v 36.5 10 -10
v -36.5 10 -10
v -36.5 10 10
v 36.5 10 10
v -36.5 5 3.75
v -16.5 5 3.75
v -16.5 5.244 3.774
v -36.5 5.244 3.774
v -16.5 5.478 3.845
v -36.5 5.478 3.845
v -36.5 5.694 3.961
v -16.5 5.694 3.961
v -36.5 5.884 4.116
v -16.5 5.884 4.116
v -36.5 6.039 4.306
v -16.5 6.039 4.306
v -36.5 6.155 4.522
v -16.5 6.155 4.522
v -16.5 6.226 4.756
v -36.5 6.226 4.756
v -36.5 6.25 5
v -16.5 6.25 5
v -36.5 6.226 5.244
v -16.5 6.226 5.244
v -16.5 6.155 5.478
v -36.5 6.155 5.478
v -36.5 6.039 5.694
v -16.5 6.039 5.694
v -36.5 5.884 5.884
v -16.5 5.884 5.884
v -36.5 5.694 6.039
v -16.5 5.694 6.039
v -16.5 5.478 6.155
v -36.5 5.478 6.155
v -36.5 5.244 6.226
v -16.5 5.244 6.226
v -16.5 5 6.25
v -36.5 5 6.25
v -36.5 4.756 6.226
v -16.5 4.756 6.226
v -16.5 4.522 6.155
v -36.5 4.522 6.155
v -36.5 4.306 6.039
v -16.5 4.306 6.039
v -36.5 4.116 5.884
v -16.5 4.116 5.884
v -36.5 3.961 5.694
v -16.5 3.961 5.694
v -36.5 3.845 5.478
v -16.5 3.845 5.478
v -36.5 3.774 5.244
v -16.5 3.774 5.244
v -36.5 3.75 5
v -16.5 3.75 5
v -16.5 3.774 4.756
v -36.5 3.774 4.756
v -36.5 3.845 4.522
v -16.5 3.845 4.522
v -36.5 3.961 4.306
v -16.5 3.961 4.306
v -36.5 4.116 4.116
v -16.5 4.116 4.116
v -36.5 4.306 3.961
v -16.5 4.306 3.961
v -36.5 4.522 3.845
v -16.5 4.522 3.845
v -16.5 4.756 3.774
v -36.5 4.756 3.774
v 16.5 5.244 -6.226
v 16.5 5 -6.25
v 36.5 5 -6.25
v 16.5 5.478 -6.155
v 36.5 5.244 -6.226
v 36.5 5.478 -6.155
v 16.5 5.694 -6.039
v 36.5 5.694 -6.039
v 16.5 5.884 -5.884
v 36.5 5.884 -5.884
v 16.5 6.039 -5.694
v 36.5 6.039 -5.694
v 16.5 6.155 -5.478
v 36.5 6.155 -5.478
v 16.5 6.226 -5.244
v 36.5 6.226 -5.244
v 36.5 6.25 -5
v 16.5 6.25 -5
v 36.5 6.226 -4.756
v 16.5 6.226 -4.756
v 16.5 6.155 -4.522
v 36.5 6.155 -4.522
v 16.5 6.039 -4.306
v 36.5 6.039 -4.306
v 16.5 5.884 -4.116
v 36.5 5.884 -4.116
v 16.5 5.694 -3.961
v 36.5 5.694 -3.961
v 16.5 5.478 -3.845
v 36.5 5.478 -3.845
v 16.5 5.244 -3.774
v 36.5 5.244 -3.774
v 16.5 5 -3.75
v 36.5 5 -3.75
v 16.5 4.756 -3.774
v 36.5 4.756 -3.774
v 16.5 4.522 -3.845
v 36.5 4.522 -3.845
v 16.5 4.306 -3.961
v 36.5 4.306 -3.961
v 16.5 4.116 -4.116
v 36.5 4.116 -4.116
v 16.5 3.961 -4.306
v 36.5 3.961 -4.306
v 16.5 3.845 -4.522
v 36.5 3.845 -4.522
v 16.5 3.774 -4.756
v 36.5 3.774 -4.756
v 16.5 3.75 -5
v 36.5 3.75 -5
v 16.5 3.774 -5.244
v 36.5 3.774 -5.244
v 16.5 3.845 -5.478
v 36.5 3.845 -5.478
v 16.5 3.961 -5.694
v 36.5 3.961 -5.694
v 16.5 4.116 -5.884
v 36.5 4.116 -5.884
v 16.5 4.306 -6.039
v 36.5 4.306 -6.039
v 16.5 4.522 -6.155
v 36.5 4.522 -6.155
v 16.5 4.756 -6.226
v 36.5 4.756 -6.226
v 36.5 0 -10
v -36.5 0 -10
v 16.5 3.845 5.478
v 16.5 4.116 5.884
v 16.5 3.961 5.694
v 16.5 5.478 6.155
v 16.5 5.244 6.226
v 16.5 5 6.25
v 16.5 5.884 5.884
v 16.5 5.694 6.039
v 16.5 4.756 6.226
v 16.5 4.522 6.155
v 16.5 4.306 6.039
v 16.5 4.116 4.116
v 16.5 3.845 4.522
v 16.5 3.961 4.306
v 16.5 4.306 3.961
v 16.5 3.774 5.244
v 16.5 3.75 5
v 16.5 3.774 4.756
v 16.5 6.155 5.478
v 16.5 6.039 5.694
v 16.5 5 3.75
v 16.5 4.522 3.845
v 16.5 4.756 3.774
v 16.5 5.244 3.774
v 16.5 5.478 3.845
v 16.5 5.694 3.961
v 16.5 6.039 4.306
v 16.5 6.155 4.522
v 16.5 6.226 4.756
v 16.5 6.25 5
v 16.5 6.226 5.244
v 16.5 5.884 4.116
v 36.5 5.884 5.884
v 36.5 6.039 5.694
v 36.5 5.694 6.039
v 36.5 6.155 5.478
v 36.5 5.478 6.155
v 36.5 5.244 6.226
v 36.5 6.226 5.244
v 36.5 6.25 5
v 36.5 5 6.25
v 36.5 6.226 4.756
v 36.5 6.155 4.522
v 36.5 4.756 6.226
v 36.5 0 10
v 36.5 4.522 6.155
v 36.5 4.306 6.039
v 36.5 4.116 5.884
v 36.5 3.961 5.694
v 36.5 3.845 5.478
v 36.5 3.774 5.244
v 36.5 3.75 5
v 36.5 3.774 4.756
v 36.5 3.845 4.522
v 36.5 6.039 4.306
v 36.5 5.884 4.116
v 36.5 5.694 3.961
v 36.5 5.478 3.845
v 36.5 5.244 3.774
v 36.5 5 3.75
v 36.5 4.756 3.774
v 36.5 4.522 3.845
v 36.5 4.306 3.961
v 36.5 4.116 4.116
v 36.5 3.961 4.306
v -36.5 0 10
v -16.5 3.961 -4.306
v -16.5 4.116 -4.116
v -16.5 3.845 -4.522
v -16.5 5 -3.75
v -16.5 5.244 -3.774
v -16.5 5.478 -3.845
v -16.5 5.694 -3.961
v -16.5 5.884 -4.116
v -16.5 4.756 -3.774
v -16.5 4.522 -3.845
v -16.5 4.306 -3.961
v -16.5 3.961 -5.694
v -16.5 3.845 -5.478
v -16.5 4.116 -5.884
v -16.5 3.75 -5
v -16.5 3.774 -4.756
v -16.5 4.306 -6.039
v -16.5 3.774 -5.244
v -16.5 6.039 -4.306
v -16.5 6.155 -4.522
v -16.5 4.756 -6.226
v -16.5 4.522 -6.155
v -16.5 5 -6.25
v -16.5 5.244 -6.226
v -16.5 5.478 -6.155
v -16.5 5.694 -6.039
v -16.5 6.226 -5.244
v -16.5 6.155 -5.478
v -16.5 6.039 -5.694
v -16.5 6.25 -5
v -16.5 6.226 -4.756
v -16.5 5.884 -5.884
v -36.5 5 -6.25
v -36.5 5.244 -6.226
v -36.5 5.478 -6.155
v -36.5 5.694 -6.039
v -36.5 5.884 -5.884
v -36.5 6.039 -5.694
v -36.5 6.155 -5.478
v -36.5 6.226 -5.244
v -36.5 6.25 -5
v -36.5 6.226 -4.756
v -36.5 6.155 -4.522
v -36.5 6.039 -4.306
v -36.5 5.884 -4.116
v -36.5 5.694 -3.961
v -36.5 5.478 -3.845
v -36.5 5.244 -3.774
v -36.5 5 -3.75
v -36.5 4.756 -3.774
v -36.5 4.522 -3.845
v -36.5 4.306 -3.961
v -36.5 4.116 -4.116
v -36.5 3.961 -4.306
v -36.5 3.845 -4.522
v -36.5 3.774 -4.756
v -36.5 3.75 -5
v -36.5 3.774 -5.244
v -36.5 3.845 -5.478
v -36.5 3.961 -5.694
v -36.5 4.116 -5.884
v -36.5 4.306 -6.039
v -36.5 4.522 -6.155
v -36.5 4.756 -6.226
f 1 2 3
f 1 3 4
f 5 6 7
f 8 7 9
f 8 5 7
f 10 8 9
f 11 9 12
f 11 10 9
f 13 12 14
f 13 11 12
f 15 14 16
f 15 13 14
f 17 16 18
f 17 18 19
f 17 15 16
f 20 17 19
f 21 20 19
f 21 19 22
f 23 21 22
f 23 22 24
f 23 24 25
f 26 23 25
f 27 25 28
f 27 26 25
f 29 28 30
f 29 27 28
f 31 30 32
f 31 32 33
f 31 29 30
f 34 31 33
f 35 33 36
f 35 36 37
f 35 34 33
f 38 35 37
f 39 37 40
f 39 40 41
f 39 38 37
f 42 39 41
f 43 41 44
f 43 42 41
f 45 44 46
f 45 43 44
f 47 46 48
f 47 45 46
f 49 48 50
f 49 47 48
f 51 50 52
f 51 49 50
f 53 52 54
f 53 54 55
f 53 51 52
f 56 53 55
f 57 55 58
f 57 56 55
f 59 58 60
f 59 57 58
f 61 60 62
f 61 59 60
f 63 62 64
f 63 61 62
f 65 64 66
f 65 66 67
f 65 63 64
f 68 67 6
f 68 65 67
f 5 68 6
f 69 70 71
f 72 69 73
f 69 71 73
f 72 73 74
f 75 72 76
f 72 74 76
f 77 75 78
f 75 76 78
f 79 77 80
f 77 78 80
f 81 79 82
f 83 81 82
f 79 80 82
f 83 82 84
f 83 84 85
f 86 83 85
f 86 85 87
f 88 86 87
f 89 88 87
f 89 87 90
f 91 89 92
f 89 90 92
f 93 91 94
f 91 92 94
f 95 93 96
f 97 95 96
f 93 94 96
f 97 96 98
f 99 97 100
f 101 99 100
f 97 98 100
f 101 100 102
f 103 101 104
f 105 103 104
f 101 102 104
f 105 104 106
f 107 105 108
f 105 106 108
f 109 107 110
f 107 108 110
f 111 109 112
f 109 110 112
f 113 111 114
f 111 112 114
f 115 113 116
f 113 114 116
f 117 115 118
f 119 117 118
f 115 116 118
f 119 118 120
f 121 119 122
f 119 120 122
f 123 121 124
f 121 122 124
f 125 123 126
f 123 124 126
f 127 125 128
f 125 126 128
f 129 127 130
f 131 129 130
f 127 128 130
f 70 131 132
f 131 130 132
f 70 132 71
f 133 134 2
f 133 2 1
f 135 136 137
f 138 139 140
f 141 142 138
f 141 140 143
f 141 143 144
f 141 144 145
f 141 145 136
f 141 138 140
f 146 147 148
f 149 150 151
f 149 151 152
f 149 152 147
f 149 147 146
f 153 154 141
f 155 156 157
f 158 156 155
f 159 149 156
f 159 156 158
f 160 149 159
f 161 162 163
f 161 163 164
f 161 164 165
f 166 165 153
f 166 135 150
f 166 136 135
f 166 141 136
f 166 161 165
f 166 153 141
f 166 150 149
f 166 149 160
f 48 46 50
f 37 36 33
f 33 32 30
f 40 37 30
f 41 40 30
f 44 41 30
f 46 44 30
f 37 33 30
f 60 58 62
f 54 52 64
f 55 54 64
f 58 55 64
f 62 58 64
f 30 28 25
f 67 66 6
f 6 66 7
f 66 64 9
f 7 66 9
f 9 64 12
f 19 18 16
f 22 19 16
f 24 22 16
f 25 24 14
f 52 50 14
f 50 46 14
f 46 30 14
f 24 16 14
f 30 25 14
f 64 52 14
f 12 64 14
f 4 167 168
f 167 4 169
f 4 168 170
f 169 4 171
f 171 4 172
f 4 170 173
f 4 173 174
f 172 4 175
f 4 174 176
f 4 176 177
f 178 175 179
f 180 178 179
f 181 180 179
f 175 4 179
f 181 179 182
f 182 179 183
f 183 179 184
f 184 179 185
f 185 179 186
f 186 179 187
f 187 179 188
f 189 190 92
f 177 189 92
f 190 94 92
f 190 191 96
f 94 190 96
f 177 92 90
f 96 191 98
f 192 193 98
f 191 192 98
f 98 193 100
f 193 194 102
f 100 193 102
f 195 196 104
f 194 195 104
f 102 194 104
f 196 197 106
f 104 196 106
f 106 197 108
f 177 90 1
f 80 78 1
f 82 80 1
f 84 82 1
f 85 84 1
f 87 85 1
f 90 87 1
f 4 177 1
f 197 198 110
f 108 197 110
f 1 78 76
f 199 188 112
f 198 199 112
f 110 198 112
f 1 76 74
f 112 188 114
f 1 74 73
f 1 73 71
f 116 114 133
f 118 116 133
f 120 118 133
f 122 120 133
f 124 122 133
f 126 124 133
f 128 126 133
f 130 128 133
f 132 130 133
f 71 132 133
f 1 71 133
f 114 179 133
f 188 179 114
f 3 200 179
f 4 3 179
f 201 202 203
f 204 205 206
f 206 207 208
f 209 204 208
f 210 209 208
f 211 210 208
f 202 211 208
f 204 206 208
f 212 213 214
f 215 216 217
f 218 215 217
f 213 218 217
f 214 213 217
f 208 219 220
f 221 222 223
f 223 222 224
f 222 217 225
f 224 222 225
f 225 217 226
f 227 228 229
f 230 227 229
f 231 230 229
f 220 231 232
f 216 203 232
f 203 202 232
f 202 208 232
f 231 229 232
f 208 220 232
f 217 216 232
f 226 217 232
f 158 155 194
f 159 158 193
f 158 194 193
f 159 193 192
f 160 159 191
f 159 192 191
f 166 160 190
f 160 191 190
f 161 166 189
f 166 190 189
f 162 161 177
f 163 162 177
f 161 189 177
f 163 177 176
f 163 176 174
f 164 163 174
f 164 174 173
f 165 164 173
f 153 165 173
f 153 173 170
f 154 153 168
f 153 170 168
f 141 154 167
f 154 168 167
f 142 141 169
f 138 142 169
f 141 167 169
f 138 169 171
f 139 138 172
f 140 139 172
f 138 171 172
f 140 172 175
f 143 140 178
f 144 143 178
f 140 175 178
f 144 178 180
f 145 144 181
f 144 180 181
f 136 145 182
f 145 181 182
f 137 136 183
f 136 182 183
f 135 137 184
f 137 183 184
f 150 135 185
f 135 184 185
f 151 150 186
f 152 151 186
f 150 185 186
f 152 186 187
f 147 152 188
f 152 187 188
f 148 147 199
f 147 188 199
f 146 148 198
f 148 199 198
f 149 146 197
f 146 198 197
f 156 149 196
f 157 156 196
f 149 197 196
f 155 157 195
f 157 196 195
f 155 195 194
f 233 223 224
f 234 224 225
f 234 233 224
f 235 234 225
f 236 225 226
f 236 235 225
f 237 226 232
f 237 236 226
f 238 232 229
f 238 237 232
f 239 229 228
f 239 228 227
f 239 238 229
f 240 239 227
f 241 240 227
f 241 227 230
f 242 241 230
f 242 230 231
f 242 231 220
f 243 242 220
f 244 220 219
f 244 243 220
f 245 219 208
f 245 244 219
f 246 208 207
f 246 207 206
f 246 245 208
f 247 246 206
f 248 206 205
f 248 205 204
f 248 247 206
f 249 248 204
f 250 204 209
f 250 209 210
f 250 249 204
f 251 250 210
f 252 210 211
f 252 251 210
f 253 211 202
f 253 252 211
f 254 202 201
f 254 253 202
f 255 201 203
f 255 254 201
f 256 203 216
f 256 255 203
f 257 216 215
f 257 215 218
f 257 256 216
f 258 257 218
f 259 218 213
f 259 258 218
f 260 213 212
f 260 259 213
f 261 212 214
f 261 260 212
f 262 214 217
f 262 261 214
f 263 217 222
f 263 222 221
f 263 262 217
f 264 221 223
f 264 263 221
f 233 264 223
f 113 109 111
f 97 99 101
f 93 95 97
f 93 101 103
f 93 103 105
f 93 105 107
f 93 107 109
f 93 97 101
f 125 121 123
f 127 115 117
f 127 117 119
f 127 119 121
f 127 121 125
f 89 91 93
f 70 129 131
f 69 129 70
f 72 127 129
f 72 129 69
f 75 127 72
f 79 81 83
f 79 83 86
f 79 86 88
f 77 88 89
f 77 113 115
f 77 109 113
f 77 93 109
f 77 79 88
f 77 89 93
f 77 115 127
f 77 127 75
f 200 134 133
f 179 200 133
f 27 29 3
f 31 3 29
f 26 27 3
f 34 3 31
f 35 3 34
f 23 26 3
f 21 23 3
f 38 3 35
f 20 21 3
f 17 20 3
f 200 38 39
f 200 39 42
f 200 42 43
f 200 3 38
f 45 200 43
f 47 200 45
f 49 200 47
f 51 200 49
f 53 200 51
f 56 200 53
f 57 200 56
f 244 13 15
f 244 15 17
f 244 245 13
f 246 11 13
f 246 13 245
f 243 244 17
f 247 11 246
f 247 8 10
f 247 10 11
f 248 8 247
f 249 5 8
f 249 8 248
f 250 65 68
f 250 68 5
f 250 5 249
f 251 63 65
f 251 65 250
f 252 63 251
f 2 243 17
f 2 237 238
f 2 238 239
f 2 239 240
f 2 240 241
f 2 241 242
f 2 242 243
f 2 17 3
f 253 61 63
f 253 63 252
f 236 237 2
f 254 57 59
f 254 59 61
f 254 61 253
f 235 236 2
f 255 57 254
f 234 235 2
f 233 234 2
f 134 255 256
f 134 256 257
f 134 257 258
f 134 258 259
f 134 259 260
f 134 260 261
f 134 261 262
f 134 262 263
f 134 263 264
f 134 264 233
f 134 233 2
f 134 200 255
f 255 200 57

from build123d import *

# Parameters (mm, degrees)
SKETCH_1_W          = 73
SKETCH_1_H          = 20
EXTRUDE_1_DEPTH     = 10
SKETCH_2_R          = 1.25
CUT_EXTRUDE_1_DEPTH = 20


with BuildPart() as part:
    # 草图1 → 凸台-拉伸1 (new body)
    with BuildSketch(Plane(origin=(0, 0, 0), x_dir=(1, 0, 0), z_dir=(0, 1, 0))):
        Rectangle(SKETCH_1_W, SKETCH_1_H)
    extrude(amount=EXTRUDE_1_DEPTH)

    # 草图2 → 切除-拉伸1 (cut)
    with BuildSketch(Plane(origin=(36.5, 0, 0), x_dir=(0, 0, -1), z_dir=(1, 0, 0))):
        with Locations((-5, 5)):
            Circle(SKETCH_2_R)
        with Locations((5, 5)):
            Circle(SKETCH_2_R)
    cut_extrude_1 = extrude(amount=-CUT_EXTRUDE_1_DEPTH, mode=Mode.SUBTRACT)

    # 镜向1: 切除-拉伸1 across plane
    add(cut_extrude_1.mirror(Plane(origin=(0, 0, 0), x_dir=(0, 0, 1), z_dir=(1, 0, 0))), mode=Mode.SUBTRACT)


solid = part.part
